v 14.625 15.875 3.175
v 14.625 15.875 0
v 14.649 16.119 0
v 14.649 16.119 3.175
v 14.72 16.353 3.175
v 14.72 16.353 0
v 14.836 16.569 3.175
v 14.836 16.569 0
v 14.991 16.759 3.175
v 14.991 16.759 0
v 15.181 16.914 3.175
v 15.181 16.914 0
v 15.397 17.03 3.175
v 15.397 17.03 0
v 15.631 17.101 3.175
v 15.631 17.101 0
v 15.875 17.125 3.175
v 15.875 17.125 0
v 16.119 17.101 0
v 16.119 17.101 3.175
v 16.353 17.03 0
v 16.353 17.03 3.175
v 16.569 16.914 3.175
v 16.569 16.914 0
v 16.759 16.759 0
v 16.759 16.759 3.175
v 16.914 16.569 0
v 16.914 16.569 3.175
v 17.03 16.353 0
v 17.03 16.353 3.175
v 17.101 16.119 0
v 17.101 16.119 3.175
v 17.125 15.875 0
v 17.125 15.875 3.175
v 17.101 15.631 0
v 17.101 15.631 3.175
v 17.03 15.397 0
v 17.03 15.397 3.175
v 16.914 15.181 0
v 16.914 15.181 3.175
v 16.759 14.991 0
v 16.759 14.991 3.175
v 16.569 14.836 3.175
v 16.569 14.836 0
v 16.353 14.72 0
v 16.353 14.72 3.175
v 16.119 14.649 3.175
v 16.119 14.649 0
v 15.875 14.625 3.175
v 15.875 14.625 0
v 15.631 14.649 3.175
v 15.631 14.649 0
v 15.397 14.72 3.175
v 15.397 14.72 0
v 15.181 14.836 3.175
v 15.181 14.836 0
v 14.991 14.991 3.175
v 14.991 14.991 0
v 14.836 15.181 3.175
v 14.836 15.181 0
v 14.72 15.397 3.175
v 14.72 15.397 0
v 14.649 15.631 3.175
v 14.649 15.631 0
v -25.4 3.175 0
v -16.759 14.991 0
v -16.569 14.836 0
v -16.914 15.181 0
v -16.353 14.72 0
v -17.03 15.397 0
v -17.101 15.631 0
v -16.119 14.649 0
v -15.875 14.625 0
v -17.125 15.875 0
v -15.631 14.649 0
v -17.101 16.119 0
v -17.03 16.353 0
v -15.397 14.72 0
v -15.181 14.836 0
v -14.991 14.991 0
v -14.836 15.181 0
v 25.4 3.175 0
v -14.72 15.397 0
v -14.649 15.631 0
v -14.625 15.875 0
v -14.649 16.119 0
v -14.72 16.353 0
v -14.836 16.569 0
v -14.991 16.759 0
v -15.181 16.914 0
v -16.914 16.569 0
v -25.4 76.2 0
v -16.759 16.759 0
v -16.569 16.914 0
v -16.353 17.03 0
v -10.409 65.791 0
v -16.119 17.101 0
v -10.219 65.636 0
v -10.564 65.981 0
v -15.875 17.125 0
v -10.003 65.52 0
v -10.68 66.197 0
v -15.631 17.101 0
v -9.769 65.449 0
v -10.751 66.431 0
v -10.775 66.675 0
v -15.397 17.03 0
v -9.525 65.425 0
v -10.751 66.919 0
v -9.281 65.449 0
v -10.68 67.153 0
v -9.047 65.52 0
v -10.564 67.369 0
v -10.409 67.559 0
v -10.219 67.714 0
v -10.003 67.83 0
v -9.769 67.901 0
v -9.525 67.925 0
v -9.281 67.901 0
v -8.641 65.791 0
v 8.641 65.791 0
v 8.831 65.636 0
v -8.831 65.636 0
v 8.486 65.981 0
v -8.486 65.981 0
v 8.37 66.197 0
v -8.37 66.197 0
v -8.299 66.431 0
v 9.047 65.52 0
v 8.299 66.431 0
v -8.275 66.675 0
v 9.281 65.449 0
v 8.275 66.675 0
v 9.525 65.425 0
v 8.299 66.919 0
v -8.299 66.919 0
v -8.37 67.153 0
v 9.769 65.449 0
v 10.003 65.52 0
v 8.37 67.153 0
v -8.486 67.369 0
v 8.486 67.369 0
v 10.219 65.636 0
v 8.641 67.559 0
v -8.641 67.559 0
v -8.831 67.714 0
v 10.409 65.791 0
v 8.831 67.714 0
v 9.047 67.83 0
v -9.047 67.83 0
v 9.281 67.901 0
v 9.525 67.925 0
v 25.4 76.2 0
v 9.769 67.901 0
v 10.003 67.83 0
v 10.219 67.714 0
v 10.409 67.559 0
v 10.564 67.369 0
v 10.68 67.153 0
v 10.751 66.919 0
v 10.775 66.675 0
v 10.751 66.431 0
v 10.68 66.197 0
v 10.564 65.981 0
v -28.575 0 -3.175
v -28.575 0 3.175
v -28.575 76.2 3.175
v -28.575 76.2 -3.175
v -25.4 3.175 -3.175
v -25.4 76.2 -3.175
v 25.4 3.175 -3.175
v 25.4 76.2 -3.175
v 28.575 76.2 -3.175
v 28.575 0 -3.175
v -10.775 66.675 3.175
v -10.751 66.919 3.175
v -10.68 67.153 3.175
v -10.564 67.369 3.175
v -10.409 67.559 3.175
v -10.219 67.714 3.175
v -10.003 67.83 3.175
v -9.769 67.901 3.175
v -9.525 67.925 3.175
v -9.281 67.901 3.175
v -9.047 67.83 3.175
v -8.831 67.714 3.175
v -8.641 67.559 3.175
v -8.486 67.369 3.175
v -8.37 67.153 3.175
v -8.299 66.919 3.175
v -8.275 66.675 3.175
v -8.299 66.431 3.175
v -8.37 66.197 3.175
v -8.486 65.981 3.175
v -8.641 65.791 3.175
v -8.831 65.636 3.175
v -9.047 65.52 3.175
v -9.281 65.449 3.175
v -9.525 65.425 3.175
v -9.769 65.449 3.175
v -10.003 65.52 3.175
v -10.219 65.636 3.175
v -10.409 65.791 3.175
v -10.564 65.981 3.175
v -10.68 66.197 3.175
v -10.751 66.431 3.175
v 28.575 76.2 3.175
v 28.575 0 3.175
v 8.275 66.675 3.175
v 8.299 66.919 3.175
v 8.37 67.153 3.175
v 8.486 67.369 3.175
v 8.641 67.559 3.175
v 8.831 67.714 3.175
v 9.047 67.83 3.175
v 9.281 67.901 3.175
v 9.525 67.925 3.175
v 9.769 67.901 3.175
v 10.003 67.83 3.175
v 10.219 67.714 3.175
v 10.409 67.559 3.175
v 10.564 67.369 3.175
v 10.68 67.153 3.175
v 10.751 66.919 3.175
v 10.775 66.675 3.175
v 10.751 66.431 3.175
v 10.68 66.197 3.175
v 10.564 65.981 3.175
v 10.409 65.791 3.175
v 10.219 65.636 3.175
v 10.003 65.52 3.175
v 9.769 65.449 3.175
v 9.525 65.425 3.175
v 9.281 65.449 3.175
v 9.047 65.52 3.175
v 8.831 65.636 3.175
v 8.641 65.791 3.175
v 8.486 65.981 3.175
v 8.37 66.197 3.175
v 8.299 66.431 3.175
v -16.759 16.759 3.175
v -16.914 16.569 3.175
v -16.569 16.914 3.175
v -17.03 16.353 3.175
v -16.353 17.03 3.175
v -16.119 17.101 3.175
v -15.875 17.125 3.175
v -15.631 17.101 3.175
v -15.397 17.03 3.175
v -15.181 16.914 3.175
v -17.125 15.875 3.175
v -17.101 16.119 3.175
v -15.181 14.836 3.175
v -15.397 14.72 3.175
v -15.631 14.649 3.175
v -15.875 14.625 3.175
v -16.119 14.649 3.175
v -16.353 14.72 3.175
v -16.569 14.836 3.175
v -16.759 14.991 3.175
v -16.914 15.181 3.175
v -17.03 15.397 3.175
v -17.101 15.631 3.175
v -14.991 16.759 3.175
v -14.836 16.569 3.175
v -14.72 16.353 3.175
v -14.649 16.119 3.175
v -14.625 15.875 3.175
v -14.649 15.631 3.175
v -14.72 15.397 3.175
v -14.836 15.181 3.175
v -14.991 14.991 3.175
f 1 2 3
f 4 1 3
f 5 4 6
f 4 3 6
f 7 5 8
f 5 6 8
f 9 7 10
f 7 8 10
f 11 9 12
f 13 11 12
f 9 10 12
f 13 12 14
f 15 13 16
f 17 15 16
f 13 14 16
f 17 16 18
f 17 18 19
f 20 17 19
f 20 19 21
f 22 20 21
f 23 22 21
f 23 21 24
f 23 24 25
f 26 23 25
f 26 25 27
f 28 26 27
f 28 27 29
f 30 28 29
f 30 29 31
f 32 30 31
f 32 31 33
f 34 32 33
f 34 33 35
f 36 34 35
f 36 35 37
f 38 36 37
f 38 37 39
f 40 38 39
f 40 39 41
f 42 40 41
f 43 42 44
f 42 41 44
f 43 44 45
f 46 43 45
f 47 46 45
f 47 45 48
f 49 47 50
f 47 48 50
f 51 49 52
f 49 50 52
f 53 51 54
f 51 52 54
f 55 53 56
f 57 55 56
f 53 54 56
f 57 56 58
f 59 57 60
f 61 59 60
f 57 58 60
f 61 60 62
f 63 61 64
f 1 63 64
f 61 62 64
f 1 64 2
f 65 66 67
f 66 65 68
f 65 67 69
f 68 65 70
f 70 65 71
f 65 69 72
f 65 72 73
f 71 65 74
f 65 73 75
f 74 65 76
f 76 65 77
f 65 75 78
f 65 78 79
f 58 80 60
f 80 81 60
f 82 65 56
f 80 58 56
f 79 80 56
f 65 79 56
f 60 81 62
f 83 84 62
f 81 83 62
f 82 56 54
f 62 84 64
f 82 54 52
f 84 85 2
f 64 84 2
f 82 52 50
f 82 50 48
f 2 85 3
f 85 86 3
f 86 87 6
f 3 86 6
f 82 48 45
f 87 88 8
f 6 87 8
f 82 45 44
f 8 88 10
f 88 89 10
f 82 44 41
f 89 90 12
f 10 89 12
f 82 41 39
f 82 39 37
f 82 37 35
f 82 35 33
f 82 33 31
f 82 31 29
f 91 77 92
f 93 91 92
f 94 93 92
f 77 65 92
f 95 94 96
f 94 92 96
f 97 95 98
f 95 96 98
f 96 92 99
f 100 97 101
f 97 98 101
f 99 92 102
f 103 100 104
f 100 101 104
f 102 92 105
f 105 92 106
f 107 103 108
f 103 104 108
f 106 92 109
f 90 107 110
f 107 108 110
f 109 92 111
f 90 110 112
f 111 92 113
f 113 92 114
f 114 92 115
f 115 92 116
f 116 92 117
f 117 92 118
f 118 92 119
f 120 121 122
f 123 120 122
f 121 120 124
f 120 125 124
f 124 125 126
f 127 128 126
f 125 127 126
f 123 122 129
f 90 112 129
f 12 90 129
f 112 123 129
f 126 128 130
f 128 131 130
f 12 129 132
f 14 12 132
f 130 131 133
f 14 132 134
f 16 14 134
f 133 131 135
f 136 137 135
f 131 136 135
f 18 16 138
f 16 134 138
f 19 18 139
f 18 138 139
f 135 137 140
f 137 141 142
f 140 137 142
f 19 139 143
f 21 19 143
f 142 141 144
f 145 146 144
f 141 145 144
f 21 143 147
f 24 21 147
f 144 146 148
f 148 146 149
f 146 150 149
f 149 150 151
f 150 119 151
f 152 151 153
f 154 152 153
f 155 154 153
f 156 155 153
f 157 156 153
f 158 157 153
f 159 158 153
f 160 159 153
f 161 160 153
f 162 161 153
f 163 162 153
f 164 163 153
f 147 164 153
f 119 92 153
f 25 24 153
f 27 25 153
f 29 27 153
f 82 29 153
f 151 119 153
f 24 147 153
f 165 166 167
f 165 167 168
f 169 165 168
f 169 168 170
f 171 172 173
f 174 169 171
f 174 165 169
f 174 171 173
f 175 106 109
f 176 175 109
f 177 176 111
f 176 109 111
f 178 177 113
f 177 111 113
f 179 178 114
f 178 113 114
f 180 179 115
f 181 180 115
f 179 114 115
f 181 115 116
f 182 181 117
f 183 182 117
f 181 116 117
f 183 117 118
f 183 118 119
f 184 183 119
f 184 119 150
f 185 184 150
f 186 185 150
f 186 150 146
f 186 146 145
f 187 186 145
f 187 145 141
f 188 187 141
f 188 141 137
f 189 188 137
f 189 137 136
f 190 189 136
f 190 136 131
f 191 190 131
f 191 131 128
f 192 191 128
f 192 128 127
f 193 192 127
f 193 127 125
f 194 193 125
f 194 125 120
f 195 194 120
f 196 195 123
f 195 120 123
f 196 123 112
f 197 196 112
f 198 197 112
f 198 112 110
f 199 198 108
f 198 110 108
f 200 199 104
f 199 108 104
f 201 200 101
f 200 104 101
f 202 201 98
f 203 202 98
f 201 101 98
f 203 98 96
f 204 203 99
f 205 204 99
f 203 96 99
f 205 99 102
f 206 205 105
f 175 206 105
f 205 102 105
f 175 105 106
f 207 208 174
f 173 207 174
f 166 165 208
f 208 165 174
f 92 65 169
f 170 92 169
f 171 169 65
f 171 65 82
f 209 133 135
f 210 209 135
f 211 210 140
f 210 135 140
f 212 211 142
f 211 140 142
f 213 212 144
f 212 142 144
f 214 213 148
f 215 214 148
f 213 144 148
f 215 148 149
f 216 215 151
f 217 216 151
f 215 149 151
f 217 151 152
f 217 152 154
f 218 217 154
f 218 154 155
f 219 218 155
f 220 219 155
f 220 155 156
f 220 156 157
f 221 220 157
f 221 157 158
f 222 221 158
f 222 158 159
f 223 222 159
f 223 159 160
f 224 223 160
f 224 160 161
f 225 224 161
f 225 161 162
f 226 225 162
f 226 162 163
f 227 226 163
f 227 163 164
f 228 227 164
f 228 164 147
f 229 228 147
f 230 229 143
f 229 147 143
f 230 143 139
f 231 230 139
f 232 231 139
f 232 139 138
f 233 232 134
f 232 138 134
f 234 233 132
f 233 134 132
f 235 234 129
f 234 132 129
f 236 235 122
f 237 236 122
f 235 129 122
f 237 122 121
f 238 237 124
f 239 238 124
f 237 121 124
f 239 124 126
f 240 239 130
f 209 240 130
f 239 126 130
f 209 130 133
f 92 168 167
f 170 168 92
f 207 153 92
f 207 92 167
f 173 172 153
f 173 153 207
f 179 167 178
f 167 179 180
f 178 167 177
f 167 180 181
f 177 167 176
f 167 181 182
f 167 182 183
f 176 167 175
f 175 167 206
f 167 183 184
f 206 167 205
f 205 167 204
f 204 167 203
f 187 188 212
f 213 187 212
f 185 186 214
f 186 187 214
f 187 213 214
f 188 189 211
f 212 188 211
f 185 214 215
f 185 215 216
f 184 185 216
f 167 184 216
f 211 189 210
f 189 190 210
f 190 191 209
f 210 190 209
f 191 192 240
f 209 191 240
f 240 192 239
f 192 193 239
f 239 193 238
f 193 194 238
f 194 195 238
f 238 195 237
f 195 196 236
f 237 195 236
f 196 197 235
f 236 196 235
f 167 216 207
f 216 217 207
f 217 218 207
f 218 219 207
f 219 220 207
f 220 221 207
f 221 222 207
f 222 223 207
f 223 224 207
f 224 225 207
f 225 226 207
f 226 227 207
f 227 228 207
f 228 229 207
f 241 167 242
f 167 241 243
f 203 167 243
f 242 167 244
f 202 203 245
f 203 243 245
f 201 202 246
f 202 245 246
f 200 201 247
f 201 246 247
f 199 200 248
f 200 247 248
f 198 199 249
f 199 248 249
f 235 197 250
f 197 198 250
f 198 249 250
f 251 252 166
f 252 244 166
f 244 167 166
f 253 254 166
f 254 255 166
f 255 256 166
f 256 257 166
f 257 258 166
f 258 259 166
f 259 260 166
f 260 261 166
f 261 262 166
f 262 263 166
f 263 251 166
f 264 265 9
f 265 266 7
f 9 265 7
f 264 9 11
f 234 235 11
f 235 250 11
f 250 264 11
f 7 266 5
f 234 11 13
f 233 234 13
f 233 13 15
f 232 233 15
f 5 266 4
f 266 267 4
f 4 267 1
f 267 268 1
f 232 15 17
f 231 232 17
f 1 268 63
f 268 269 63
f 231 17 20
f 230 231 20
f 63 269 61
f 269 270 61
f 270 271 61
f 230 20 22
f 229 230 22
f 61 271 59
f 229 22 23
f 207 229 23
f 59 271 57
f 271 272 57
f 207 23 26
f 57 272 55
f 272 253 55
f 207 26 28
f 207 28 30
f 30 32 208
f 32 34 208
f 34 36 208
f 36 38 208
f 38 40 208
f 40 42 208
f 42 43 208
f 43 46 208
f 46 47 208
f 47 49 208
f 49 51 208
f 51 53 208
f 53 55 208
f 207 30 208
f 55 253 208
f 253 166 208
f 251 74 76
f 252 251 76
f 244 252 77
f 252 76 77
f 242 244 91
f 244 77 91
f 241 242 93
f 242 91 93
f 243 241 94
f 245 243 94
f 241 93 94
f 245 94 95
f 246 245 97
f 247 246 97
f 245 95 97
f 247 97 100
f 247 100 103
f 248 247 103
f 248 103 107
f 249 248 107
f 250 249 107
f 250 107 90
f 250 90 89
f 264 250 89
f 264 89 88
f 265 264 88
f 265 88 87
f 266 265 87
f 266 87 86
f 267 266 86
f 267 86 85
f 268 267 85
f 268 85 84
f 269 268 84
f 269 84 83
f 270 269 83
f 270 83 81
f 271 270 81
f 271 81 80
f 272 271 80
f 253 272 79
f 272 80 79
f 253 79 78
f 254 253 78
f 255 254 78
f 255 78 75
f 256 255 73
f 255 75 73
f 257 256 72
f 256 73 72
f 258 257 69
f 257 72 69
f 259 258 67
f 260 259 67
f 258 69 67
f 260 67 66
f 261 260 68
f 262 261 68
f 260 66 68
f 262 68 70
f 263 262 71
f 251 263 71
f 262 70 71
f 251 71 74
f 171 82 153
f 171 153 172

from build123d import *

# Parameters (mm, degrees)
SKETCH1_W           = 57.15
SKETCH1_H           = 6.35
BOSS_EXTRUDE1_DEPTH = 76.2
SKETCH2_W           = 50.8
SKETCH2_H           = 3.175
CUT_EXTRUDE1_DEPTH  = 73.025
SKETCH4_R           = 1.25
CUT_EXTRUDE2_DEPTH  = 4.175


with BuildPart() as part:
    # Sketch1 → Boss-Extrude1 (new body)
    with BuildSketch(Plane(origin=(0, 0, 0), x_dir=(1, 0, 0), z_dir=(0, 1, 0))):
        Rectangle(SKETCH1_W, SKETCH1_H)
    extrude(amount=BOSS_EXTRUDE1_DEPTH)

    # Sketch2 → Cut-Extrude1 (cut)
    with BuildSketch(Plane(origin=(0, 76.2, 0), x_dir=(1, 0, 0), z_dir=(0, 1, 0))):
        with Locations((0, 1.5875)):
            Rectangle(SKETCH2_W, SKETCH2_H)
    extrude(amount=-CUT_EXTRUDE1_DEPTH, mode=Mode.SUBTRACT)

    # Sketch4 → Cut-Extrude2 (cut, through all)
    with BuildSketch(Plane(origin=(0, 0, 0), x_dir=(-1, 0, 0), z_dir=(0, 0, -1))):
        with Locations((-9.525, 66.675)):
            Circle(SKETCH4_R)
        with Locations((9.525, 66.675)):
            Circle(SKETCH4_R)
        with Locations((-15.875, 15.875)):
            Circle(SKETCH4_R)
        with Locations((15.875, 15.875)):
            Circle(SKETCH4_R)
    extrude(amount=-CUT_EXTRUDE2_DEPTH, mode=Mode.SUBTRACT)


solid = part.part
